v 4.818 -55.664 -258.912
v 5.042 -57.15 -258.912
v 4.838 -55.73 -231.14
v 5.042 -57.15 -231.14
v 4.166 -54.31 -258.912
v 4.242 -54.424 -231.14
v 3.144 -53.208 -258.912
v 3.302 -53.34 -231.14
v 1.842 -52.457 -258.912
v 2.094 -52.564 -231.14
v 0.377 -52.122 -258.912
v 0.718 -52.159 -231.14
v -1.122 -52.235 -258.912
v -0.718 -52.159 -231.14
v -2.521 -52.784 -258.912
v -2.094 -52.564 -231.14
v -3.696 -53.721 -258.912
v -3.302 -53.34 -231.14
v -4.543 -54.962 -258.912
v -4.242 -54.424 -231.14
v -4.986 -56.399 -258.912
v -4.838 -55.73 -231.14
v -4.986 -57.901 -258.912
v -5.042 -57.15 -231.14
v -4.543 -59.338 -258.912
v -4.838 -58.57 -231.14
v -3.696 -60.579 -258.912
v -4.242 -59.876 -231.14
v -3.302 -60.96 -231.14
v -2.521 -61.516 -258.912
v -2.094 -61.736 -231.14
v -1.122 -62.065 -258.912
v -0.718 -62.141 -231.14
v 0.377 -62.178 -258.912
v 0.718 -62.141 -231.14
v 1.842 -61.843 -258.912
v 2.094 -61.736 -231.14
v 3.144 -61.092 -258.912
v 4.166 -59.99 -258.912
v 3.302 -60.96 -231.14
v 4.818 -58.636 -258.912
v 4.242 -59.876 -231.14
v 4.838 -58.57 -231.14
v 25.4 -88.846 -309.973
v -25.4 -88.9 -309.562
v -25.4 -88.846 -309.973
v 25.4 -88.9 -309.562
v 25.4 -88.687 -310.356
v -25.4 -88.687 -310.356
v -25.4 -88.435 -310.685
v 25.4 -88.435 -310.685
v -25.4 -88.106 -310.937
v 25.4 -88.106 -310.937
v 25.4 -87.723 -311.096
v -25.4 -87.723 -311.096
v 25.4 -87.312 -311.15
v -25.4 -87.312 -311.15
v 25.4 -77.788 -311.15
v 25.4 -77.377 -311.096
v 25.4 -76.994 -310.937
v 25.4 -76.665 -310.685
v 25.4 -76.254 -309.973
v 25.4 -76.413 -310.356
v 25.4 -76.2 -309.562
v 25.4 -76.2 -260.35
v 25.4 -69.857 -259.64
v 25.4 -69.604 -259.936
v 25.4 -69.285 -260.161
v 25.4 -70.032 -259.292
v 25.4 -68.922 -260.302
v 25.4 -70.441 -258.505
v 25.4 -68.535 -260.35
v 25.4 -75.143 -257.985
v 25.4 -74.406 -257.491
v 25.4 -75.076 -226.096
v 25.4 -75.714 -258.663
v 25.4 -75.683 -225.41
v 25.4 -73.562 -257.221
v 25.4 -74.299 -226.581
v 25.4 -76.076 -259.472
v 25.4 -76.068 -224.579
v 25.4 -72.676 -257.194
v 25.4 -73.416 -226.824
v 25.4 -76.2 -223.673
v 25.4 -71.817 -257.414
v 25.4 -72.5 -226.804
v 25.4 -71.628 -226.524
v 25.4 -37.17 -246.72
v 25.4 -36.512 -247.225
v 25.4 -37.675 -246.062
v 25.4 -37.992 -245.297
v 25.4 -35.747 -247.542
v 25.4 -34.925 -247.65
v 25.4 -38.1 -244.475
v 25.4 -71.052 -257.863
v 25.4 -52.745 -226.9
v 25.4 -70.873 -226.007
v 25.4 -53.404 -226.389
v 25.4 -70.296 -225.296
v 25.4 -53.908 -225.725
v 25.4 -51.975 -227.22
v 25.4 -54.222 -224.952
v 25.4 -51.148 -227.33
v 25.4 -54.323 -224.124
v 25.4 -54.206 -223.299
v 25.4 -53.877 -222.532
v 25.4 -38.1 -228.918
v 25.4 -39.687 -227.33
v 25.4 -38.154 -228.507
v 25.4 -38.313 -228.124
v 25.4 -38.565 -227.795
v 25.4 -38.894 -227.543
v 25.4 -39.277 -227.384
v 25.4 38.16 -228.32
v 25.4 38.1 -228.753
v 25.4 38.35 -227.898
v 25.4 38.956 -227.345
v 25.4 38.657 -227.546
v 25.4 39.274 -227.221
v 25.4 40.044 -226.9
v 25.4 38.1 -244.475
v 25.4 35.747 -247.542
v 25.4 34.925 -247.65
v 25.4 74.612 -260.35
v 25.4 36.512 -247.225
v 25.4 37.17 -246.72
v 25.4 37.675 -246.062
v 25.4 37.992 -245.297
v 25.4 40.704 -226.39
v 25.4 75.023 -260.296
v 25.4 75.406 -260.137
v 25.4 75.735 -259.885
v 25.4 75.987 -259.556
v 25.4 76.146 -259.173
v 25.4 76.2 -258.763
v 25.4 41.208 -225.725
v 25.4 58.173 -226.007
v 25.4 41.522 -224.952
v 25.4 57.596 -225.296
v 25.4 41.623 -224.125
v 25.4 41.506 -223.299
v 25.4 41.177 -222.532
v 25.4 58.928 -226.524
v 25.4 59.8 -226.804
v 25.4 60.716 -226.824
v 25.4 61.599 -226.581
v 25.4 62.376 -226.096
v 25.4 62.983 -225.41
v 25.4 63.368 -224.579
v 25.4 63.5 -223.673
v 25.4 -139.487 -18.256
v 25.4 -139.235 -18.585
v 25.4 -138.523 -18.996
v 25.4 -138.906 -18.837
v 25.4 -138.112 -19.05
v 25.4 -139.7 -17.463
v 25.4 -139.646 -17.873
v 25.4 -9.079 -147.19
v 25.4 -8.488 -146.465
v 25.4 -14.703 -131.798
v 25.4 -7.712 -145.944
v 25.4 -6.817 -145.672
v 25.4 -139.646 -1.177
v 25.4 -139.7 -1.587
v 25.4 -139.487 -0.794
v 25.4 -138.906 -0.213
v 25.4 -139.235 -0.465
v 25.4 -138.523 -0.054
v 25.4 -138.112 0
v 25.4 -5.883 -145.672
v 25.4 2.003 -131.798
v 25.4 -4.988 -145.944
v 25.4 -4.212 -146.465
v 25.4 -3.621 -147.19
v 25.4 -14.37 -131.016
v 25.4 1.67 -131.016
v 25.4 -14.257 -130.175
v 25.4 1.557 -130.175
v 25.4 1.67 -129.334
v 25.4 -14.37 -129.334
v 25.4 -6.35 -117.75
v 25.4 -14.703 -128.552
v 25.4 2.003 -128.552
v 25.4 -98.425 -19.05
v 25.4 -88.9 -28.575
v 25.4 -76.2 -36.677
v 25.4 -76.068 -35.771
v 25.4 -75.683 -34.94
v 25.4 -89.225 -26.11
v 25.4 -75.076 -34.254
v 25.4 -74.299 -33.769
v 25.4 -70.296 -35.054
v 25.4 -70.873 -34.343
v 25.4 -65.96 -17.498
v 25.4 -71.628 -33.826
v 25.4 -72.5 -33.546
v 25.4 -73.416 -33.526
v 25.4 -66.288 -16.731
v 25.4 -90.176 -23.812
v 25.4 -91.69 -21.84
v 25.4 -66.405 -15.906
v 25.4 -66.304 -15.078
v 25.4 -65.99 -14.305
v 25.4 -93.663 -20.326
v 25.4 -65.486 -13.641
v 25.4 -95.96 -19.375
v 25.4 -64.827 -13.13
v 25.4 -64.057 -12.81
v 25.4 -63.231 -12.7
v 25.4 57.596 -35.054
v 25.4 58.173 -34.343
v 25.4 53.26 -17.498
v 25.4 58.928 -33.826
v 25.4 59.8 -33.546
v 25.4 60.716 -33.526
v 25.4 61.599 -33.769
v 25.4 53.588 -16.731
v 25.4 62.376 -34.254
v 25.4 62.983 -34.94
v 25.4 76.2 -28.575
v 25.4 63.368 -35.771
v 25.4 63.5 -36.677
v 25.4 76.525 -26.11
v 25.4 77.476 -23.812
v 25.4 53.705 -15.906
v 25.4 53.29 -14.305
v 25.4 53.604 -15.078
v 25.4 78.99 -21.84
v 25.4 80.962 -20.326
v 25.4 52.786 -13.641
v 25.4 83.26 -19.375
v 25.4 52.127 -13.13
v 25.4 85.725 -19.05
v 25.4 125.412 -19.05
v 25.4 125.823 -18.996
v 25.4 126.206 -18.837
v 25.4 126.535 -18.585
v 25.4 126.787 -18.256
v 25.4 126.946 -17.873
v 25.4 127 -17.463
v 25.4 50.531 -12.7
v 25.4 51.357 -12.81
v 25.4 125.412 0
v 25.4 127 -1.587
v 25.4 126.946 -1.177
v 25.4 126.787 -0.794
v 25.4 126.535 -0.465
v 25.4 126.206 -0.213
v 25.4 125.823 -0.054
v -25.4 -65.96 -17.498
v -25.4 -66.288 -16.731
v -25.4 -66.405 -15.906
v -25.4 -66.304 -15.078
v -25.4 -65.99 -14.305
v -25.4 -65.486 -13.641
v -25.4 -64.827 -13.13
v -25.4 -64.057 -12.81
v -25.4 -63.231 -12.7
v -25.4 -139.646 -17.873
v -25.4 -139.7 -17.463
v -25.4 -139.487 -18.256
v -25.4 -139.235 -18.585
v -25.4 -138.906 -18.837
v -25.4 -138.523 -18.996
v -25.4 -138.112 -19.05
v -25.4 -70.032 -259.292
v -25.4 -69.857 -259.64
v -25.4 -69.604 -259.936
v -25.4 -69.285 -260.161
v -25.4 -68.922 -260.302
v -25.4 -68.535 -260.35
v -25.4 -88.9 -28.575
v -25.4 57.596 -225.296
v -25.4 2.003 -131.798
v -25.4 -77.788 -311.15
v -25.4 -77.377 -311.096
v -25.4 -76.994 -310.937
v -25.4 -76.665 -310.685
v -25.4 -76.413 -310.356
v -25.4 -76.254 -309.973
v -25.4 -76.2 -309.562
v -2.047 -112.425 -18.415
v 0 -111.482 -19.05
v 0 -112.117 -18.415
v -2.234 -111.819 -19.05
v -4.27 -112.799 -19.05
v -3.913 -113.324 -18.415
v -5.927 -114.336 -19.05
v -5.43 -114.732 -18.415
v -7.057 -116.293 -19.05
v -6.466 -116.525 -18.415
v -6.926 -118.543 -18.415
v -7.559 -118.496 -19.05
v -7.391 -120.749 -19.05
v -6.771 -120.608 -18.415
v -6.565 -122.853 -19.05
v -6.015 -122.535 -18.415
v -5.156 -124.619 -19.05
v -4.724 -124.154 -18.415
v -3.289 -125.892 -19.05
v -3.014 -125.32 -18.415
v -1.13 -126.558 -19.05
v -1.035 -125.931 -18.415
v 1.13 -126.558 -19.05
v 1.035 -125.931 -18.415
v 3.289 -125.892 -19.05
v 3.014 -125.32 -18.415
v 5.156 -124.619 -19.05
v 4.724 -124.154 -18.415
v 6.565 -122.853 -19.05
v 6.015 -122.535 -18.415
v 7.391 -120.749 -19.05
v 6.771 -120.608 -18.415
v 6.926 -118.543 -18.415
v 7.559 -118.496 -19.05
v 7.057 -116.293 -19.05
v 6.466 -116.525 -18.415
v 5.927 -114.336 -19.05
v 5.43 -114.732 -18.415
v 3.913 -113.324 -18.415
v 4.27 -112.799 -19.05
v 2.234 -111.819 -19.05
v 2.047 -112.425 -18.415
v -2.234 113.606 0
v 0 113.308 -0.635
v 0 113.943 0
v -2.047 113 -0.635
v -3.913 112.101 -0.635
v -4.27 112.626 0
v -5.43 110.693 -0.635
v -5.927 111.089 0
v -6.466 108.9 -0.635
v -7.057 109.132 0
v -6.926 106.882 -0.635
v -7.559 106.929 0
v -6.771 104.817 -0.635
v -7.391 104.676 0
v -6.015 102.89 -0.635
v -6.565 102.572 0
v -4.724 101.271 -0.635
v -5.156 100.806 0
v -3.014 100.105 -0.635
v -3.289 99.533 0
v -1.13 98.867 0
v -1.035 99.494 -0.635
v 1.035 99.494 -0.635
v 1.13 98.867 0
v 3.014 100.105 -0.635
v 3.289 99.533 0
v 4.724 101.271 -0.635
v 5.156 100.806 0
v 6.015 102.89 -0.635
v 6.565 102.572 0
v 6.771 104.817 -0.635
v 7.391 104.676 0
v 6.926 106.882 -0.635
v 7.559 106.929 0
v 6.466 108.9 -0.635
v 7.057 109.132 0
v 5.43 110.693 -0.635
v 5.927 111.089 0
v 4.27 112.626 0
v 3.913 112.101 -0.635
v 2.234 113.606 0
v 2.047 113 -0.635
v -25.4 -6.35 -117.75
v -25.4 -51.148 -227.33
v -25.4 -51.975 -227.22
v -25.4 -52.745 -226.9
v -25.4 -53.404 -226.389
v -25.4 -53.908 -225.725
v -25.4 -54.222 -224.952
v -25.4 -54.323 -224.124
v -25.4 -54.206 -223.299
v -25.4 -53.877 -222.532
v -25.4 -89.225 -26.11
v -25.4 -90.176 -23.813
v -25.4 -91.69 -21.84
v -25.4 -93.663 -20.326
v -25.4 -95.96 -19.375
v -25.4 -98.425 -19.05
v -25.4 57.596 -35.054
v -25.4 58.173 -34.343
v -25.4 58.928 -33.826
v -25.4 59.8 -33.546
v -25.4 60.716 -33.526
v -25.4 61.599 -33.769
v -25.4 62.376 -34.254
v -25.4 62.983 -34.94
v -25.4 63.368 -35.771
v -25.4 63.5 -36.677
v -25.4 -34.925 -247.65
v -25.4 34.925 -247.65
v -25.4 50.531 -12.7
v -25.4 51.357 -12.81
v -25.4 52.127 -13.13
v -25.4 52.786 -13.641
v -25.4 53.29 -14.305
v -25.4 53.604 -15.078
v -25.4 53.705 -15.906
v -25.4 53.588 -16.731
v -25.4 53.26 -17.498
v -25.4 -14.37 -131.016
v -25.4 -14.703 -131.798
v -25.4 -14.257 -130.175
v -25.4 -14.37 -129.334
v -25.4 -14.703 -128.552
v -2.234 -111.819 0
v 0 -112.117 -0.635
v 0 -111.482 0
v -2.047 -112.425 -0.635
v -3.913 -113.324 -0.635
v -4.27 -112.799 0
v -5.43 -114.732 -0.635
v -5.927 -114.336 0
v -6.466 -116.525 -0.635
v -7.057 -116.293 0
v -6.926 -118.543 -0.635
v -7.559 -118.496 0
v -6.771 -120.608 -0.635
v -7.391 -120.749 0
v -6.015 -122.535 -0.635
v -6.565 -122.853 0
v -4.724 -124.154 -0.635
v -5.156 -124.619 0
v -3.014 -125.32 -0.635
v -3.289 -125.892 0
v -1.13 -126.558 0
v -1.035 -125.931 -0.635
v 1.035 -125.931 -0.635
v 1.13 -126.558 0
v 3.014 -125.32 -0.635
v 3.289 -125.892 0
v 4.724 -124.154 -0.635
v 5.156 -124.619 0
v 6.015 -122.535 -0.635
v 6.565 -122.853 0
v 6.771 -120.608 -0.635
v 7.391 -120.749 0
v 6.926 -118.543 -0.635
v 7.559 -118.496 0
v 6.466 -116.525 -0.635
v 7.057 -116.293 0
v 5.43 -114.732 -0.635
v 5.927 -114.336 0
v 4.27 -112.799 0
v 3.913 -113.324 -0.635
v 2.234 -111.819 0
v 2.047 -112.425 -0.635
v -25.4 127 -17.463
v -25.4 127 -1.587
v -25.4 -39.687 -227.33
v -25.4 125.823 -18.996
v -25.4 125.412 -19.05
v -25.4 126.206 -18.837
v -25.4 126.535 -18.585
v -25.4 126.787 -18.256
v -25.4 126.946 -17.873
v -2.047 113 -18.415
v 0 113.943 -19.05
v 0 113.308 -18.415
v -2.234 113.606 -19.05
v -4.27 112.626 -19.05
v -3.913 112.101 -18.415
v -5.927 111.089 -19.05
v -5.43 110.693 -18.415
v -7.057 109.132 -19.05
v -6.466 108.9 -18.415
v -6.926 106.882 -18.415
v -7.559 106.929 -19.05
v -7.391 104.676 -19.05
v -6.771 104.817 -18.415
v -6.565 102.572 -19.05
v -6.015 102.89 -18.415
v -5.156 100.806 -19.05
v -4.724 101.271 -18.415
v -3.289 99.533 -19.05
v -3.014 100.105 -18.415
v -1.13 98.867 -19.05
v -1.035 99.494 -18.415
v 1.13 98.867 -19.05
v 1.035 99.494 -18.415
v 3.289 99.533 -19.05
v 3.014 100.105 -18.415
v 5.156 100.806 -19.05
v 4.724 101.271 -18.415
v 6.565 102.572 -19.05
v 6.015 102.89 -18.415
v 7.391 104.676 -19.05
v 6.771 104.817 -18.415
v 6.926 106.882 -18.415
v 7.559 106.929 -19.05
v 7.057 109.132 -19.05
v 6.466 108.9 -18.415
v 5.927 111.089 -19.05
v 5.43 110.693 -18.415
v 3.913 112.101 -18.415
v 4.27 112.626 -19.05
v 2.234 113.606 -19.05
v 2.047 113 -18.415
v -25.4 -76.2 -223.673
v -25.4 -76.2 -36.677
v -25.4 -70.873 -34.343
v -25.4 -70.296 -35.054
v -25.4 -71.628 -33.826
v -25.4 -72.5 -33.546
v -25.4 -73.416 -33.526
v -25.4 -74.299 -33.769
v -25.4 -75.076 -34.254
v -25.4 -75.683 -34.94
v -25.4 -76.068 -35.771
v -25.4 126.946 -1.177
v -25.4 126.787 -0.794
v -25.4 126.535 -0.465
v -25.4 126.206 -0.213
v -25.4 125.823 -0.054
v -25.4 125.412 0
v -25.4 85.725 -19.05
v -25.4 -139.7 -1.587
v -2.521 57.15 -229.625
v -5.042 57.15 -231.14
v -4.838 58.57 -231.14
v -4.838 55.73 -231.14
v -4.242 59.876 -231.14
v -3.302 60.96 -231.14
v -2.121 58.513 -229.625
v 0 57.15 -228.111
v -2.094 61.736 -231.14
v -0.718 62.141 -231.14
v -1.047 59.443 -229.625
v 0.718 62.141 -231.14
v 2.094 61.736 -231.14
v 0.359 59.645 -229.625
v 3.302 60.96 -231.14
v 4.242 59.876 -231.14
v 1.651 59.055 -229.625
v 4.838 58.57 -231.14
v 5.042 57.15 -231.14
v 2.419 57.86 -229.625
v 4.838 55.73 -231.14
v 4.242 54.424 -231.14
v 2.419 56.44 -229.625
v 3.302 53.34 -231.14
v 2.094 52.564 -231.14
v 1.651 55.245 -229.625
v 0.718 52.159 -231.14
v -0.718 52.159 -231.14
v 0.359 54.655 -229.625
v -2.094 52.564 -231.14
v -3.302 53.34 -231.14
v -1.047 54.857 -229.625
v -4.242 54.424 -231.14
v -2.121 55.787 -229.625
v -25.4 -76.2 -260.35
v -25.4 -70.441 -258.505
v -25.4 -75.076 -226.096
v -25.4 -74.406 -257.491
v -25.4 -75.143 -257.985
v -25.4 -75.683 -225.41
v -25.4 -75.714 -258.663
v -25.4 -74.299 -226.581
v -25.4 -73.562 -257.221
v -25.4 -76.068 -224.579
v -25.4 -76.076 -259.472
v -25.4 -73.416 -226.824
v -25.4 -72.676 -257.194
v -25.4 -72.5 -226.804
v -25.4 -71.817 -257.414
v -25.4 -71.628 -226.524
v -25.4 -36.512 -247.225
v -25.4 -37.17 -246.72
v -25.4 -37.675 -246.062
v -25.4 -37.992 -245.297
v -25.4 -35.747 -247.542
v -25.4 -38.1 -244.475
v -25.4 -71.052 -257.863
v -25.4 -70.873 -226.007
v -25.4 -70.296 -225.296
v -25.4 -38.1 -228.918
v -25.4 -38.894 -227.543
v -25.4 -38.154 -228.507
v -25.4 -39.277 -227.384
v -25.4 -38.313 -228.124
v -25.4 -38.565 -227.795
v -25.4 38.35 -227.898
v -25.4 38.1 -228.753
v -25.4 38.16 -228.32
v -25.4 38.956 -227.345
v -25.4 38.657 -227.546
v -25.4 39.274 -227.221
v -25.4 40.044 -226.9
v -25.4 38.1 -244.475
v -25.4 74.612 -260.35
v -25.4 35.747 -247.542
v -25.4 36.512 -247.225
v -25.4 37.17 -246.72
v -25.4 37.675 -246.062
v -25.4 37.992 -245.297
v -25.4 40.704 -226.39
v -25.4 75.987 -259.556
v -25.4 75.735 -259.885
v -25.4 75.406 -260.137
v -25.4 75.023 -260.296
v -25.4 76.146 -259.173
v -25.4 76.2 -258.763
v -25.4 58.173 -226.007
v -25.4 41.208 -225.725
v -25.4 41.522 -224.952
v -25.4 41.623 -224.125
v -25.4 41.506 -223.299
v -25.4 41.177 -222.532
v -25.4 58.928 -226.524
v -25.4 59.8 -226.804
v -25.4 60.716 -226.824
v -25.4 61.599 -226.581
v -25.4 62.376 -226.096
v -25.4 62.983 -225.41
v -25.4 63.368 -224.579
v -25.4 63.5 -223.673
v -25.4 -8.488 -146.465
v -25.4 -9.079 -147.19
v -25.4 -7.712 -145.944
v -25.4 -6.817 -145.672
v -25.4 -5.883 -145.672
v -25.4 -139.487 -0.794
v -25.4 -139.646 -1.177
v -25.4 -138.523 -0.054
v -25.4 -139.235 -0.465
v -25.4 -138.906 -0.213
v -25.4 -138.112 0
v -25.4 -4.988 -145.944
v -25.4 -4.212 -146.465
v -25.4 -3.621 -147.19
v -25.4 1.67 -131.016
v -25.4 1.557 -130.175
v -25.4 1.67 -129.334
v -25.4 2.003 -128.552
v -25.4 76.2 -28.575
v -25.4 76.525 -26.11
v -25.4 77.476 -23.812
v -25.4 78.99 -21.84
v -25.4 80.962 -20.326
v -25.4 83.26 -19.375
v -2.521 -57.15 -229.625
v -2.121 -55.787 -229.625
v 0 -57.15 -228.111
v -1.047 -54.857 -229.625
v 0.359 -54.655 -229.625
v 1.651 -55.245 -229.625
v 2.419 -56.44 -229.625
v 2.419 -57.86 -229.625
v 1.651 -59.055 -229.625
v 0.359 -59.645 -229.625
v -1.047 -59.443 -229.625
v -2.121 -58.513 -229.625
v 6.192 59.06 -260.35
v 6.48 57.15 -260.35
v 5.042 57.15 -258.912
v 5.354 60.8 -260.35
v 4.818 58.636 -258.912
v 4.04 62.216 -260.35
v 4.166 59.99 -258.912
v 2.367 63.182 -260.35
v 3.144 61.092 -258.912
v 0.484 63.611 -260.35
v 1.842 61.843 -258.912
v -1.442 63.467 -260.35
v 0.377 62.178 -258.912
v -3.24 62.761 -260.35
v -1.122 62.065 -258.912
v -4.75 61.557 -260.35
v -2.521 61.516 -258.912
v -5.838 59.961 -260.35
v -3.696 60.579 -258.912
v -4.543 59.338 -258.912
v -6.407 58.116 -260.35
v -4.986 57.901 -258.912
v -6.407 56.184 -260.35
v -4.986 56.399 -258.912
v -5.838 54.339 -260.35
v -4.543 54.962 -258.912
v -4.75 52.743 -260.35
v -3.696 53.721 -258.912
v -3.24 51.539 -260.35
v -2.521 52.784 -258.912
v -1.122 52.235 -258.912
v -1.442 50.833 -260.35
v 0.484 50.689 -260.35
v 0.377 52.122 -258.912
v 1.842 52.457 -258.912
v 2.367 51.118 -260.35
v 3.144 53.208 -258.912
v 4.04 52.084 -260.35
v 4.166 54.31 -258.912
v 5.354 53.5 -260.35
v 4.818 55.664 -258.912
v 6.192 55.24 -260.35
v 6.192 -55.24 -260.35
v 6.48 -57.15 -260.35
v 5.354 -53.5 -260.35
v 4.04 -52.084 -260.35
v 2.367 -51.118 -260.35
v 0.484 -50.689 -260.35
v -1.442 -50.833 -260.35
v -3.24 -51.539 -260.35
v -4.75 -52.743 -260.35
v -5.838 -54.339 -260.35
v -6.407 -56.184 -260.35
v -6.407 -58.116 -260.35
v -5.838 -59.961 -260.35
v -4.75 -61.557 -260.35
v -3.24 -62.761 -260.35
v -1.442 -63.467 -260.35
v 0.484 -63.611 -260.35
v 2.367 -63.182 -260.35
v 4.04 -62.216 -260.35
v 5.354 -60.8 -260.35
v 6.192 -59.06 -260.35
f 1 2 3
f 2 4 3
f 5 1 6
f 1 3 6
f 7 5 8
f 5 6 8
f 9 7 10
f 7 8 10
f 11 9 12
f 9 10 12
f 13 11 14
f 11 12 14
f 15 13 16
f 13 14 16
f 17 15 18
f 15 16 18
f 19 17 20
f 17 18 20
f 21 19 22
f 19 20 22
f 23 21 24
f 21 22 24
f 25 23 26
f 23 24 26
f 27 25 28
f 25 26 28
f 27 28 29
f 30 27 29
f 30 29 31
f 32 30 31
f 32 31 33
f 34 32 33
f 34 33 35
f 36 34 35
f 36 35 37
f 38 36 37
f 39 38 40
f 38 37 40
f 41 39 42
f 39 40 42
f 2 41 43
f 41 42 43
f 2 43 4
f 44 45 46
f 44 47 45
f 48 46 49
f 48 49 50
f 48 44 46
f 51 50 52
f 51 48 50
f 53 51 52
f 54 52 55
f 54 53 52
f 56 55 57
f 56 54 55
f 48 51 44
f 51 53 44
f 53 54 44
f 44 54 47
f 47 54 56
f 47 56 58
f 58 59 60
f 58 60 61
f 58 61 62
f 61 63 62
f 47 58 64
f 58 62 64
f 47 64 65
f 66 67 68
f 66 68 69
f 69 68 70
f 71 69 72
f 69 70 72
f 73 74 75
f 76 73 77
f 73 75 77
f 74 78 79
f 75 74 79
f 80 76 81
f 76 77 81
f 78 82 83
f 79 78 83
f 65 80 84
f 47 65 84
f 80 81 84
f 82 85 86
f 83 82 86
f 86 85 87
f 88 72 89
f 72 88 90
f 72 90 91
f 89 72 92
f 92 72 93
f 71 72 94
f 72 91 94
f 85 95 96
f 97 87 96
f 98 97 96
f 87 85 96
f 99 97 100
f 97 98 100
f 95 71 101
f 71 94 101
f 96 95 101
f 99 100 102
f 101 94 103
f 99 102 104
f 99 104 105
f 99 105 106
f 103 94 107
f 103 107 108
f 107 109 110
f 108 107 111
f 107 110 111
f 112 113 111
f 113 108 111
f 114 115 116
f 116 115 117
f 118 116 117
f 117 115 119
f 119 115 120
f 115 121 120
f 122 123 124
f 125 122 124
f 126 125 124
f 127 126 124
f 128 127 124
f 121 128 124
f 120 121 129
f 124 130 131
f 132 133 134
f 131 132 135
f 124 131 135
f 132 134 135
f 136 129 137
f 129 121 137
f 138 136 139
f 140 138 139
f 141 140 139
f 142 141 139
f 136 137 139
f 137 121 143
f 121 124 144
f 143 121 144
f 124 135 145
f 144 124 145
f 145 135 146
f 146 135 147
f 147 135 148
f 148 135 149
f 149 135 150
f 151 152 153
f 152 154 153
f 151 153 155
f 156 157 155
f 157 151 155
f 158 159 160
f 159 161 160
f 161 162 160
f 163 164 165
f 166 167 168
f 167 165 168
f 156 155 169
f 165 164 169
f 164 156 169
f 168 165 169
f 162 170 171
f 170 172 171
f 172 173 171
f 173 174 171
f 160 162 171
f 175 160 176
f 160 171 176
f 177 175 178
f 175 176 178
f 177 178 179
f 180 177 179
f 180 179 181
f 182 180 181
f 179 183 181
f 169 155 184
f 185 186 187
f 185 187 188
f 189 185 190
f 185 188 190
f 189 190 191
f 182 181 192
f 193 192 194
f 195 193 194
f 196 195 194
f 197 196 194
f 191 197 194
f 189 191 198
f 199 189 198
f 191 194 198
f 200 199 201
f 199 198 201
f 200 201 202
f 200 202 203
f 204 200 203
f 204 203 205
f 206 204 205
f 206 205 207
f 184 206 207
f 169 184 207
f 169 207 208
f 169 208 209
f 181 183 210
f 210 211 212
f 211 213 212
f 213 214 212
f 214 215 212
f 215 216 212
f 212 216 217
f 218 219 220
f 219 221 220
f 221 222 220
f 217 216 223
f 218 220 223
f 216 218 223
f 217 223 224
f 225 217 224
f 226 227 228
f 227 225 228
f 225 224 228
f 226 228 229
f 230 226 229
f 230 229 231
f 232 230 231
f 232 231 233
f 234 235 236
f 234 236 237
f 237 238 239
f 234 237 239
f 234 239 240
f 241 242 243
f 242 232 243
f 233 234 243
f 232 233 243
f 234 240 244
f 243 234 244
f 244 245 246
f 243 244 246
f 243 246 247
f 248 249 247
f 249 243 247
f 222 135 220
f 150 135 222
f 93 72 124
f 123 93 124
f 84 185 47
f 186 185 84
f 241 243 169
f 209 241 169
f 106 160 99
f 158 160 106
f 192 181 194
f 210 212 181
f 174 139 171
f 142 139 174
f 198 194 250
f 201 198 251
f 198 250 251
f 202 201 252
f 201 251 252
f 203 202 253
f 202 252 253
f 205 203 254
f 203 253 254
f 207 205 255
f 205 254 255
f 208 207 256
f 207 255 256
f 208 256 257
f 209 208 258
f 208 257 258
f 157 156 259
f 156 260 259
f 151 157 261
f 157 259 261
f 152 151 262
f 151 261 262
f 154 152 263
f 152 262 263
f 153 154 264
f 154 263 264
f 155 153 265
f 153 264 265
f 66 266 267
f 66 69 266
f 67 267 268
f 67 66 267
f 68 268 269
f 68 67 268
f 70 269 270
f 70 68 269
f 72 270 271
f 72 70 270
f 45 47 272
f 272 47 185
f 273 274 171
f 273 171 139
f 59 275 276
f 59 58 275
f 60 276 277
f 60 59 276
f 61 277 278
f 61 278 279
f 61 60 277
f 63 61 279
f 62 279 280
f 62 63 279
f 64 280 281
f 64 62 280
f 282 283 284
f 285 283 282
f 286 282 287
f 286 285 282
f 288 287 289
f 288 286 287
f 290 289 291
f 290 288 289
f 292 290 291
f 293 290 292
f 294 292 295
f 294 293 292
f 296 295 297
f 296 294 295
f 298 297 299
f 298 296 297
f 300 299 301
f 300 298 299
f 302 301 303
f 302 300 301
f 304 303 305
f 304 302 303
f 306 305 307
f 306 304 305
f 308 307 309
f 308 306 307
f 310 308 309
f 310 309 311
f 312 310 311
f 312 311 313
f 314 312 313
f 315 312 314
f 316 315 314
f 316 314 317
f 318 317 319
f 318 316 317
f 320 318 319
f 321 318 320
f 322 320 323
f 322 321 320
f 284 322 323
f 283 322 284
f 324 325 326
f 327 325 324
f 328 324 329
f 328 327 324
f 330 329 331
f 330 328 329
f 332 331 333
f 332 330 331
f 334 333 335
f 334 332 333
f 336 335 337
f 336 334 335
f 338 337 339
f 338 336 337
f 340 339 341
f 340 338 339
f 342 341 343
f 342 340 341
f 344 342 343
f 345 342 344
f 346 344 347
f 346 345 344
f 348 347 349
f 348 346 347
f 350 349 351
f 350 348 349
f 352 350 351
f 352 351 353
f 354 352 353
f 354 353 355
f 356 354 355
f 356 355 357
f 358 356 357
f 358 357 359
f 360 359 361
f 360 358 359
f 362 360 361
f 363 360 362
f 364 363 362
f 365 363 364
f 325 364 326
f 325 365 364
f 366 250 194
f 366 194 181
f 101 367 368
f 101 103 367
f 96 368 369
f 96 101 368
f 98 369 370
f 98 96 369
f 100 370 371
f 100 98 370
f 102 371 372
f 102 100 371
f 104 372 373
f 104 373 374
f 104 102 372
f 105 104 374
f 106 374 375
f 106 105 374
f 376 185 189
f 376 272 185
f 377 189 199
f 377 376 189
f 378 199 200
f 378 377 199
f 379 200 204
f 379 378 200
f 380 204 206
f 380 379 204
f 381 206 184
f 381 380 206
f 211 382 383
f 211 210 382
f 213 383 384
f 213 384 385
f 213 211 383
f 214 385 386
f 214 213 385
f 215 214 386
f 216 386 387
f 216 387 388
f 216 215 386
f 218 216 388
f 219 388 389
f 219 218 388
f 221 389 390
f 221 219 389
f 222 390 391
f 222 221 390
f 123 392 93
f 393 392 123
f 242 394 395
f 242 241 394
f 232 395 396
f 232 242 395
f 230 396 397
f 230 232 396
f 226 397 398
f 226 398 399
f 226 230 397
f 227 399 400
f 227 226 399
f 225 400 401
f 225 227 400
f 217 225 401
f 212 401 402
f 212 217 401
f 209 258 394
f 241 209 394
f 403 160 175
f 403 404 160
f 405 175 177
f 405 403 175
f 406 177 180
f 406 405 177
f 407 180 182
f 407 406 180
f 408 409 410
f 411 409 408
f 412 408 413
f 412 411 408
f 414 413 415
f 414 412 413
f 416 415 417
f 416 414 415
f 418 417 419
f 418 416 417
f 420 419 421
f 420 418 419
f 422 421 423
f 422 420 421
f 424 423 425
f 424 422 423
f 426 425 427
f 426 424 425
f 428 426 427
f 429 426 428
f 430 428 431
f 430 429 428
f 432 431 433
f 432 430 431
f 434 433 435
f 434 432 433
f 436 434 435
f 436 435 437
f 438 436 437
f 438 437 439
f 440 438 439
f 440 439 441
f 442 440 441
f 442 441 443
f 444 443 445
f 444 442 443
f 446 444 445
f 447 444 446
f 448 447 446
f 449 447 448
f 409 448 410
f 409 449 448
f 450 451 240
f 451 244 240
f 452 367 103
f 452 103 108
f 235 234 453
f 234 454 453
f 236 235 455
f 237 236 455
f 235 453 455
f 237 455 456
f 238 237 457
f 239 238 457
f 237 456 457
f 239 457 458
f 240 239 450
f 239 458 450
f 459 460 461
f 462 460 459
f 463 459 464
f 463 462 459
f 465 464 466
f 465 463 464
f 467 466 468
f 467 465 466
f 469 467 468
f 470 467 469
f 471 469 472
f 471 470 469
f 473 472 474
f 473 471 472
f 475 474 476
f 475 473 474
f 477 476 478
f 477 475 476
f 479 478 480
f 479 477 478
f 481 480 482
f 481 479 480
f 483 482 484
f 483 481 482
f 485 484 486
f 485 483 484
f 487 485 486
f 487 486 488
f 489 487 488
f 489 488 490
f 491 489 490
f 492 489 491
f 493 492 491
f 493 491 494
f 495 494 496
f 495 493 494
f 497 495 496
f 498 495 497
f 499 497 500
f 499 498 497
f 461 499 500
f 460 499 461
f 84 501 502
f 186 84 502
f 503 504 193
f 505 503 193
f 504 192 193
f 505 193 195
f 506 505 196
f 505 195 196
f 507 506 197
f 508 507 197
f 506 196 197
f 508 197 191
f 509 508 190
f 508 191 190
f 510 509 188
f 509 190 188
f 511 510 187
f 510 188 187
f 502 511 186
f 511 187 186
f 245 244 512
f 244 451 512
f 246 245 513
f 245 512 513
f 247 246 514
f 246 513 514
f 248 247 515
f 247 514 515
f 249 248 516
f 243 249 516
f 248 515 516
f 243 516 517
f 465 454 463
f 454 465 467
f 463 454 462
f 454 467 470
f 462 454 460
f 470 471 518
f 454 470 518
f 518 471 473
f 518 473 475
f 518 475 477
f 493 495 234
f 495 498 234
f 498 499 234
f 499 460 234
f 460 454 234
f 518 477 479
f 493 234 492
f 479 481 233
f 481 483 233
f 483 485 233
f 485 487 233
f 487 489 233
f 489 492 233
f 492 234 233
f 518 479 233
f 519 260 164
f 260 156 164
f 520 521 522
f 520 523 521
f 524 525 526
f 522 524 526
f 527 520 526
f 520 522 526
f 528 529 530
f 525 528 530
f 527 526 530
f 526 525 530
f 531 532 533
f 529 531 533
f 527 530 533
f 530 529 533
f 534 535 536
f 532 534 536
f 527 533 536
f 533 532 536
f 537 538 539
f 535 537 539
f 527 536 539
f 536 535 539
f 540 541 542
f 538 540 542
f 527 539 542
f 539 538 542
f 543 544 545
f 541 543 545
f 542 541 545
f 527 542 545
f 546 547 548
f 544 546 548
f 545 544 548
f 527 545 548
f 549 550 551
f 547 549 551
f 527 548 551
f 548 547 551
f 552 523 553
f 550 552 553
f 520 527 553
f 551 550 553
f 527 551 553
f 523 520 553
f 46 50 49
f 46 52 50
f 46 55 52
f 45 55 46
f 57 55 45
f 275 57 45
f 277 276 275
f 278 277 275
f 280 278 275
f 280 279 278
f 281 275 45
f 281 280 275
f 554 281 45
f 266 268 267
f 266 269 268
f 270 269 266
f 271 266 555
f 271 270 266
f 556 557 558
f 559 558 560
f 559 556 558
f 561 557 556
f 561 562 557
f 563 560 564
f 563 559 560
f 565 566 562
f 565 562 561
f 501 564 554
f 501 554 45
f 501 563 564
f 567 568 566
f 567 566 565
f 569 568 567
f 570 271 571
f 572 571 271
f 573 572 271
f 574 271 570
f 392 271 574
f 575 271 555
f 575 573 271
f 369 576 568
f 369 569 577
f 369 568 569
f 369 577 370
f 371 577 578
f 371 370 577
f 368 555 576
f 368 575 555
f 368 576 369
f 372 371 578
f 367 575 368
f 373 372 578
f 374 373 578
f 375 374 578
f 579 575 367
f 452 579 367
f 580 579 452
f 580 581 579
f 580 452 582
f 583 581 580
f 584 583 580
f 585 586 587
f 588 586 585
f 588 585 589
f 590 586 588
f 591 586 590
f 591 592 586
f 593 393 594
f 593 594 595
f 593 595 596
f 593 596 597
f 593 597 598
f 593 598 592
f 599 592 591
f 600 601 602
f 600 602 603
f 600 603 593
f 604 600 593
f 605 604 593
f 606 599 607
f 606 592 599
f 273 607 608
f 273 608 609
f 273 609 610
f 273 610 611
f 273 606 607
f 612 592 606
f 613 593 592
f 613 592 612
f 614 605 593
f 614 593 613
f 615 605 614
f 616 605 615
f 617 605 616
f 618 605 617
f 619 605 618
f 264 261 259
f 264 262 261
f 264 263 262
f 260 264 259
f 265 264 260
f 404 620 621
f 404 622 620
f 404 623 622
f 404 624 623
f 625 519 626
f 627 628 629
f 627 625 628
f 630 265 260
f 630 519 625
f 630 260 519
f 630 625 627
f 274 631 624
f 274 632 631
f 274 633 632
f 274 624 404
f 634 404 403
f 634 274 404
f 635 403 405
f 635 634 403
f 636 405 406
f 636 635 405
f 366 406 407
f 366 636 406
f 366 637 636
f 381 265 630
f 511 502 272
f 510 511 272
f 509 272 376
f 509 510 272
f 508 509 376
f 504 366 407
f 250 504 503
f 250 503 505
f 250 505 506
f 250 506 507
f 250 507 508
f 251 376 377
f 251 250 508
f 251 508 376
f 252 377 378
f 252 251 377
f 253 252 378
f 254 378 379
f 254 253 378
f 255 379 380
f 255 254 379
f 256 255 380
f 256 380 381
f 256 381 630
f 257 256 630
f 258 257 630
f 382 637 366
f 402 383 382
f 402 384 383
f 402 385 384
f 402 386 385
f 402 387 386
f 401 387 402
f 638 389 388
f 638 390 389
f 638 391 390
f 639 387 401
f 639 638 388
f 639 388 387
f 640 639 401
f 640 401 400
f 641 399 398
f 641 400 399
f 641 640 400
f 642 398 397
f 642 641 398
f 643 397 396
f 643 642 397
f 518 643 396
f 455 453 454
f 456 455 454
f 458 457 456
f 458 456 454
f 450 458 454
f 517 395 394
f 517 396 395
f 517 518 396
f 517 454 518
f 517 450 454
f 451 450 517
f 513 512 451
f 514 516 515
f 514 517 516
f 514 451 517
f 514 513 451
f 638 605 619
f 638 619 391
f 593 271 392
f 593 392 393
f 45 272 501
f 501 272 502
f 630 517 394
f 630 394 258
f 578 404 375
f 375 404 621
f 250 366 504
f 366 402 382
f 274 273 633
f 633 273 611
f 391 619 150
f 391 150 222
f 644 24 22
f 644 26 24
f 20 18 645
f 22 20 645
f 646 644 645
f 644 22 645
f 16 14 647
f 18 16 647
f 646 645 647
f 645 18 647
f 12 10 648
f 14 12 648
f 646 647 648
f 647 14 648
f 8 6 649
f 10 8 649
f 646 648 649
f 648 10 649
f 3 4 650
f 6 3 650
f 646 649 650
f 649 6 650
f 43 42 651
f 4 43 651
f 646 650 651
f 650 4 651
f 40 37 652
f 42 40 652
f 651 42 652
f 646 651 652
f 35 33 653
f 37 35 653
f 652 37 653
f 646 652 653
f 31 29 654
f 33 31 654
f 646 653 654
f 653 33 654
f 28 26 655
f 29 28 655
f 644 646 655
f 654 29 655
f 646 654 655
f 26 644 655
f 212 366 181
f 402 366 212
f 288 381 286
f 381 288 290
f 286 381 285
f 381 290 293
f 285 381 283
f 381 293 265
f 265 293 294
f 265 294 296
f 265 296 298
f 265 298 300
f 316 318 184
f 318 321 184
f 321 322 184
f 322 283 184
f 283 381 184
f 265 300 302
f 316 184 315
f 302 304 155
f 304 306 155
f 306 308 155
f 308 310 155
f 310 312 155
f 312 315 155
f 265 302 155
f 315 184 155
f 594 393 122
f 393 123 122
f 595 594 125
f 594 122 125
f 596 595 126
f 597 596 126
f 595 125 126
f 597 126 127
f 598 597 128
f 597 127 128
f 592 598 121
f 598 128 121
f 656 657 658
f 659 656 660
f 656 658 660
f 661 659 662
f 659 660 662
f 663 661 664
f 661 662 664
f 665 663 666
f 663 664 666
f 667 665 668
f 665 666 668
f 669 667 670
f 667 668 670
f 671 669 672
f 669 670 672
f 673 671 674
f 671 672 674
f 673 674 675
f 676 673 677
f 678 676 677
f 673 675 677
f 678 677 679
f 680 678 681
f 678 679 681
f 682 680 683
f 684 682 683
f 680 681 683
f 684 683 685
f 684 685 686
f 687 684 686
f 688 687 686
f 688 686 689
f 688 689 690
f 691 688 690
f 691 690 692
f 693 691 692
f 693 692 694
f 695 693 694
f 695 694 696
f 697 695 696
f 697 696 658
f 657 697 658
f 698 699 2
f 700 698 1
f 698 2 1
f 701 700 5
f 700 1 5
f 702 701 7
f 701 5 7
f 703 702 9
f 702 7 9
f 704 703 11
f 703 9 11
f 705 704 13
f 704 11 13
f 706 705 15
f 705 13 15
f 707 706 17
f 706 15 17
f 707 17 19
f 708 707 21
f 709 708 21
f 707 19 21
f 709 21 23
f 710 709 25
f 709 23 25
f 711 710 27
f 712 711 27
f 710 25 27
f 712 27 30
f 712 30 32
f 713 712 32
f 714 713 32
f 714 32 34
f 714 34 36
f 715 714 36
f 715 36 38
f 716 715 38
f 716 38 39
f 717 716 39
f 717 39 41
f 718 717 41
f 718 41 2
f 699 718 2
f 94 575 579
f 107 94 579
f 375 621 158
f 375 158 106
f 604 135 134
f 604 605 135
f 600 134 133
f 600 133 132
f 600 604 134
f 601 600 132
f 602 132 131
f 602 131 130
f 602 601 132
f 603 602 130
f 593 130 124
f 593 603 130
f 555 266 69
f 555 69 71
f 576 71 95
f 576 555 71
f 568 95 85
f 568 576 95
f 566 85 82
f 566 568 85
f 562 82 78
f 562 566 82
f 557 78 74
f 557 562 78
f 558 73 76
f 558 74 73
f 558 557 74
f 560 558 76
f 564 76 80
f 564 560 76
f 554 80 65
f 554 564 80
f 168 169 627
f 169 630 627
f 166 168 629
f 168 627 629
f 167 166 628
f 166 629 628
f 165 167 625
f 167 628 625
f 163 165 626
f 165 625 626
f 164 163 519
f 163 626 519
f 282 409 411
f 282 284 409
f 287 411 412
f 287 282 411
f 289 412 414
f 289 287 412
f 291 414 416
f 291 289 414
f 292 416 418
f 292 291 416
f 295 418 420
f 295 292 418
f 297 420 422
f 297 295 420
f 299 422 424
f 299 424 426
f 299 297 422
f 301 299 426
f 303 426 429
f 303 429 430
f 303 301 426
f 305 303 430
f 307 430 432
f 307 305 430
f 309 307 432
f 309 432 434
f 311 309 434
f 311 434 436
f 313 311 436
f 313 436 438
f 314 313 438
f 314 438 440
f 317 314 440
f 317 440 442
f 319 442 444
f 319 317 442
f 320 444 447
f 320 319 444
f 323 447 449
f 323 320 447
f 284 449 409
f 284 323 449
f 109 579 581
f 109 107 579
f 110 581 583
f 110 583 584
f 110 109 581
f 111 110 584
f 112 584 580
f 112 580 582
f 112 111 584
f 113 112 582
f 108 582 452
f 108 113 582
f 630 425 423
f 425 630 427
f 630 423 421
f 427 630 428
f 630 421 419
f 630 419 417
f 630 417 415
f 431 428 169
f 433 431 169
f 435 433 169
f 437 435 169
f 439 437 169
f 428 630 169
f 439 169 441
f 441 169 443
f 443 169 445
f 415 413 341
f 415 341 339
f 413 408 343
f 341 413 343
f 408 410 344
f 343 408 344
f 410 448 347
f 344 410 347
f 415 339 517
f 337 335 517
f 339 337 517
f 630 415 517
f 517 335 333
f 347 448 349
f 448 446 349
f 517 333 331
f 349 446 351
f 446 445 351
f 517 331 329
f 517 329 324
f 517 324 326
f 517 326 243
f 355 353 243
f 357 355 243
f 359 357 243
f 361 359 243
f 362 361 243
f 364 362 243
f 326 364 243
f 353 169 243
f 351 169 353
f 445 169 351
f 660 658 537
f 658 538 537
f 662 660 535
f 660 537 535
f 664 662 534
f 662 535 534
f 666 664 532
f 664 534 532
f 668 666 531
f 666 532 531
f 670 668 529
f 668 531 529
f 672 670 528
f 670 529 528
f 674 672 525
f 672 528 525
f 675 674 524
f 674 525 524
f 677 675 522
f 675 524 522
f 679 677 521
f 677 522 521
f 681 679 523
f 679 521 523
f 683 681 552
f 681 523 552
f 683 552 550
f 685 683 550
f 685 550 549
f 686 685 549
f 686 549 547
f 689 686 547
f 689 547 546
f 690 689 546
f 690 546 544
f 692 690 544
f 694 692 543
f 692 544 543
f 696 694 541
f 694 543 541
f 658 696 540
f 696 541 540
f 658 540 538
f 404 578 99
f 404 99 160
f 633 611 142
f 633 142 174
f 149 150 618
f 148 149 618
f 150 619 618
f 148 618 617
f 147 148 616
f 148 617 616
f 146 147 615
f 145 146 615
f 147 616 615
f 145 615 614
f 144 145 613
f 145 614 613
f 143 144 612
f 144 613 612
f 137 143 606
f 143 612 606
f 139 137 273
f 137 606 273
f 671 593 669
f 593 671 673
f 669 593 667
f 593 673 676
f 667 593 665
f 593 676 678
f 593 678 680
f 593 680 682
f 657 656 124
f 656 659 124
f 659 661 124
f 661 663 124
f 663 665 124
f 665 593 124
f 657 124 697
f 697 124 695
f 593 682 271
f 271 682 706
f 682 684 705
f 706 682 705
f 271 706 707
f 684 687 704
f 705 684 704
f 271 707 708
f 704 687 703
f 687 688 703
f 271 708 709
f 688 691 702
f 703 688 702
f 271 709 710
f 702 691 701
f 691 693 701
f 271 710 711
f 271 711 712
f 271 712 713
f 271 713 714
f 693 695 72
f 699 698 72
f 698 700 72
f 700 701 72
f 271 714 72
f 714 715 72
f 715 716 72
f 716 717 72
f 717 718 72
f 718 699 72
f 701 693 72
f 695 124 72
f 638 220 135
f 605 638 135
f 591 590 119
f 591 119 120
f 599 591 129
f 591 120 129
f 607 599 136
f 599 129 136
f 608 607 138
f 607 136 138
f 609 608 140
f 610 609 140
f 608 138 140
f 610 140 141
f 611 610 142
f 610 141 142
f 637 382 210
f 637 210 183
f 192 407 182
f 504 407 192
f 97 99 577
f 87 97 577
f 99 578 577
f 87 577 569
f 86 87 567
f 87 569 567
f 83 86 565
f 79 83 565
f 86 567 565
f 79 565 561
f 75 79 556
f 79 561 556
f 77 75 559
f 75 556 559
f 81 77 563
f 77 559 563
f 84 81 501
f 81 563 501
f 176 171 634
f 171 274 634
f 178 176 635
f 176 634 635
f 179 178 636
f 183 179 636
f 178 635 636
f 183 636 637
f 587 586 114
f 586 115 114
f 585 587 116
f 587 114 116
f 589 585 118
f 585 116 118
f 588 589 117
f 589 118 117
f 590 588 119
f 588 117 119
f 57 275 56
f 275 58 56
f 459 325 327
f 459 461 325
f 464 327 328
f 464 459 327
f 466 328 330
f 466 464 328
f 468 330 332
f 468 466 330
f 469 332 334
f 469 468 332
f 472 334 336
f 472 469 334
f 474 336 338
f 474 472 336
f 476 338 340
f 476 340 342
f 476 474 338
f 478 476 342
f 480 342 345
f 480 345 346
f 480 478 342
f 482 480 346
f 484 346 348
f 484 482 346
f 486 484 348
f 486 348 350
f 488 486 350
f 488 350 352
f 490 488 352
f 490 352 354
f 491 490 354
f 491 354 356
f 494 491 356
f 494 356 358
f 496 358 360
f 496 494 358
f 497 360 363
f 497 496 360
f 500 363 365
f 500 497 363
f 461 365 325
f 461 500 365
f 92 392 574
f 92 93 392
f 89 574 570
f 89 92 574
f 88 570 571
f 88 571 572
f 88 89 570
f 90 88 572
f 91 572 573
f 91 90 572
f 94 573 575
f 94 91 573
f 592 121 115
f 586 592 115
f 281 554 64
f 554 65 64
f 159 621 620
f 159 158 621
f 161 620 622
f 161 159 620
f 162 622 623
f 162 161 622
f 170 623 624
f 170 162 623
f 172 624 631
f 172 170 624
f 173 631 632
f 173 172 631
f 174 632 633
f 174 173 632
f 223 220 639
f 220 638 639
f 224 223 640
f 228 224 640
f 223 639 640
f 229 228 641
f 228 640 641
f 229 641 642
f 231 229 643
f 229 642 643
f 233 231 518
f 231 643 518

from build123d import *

# Parameters (mm, degrees)
BOSS_EXTRUDE1_DEPTH                          = 25.4
SKETCH2_W                                    = 234.95
SKETCH2_H                                    = 139.7
CUT_EXTRUDE1_DEPTH                           = 51.8
EXTRUDE_THIN1_DEPTH                          = 50.8
EXTRUDE_THIN2_DEPTH                          = 50.8
FILLET5_R                                    = 3.175
SKETCH11_W                                   = 33.02
SKETCH11_H                                   = 38.1
BOSS_EXTRUDE2_DEPTH                          = 50.8
TAPPED_HOLE_FOR_3_8_16_HELICOIL1_D           = 10.0838
TAPPED_HOLE_FOR_3_8_16_HELICOIL1_DEPTH       = 29.21
TAPPED_HOLE_FOR_3_8_16_HELICOIL1_CSINK_D     = 12.95908
TAPPED_HOLE_FOR_3_8_16_HELICOIL1_CSINK_ANGLE = 90
TAPPED_HOLE_FOR_3_8_16_HELICOIL1_TIP         = 3.029479155
CUT_EXTRUDE2_DEPTH                           = 51.8
FILLET1_R                                    = 3.175
FILLET2_R                                    = 1.5875
FILLET3_R                                    = 9.525
F_1_2_CLEARANCE_HOLE1_AT_2_COUNT             = 2
F_1_2_CLEARANCE_HOLE1_AT_2_PITCH             = 225.425


with BuildPart() as part:
    # Sketch1 → Boss-Extrude1 (new body, symmetric)
    with BuildSketch(Plane(origin=(0, 0, 0), x_dir=(0, 0, -1), z_dir=(1, 0, 0))):
        Polygon((311.15, -88.9), (19.05, -88.9), (19.05, -139.7), (0, -139.7), (0, 127), (19.05, 127), (19.05, 76.2), (260.35, 76.2), (260.35, -76.2), (311.15, -76.2), align=None)
    extrude(amount=BOSS_EXTRUDE1_DEPTH, both=True)

    # Sketch2 → Cut-Extrude1 (cut, through all)
    with BuildSketch(Plane.ZY.offset(25.4)):
        with Locations((-130.175, -6.35)):
            Rectangle(SKETCH2_W, SKETCH2_H)
    extrude(amount=-CUT_EXTRUDE1_DEPTH, mode=Mode.SUBTRACT)

    # Sketch3 → Extrude-Thin1 (add)
    with BuildSketch(Plane.ZY.offset(25.4)):
        Polygon((-250.895328745, 58.041947111), (-15.945328745, -81.658052889), (-9.454671255, -70.741947111), (-244.404671255, 68.958052889), align=None)
    extrude(amount=-EXTRUDE_THIN1_DEPTH)

    # Sketch4 → Extrude-Thin2 (add)
    with BuildSketch(Plane.ZY.offset(25.4)):
        Polygon((-244.404671255, -81.658052889), (-9.454671255, 58.041947111), (-15.945328745, 68.958052889), (-250.895328745, -70.741947111), align=None)
    extrude(amount=-EXTRUDE_THIN2_DEPTH)

    # Fillet5
    fillet5_edges = [part.edges().sort_by_distance(p)[0] for p in [
        (0, -76.2, -235.225218669),
        (0, 63.5, -235.225218669),
    ]]
    fillet(fillet5_edges, radius=FILLET5_R)

    # Sketch11 → Boss-Extrude2 (add)
    with BuildSketch(Plane.ZY.offset(25.4)):
        with Locations((-243.84, -57.15)):
            Rectangle(SKETCH11_W, SKETCH11_H)
    boss_extrude2 = extrude(amount=-BOSS_EXTRUDE2_DEPTH)

    # Mirror2: Boss-Extrude2 across plane
    add(boss_extrude2.mirror(Plane.ZX))

    # Tapped Hole for 3/8-16 Helicoil1
    with Locations(Plane(origin=(-14.876894715, 2.702023936, -260.35), x_dir=(-1, 0, 0), z_dir=(0, 0, -1))):
        with Locations((-14.876894715, 54.447976064), (-14.876894715, -59.852023936)):
            CounterSinkHole(TAPPED_HOLE_FOR_3_8_16_HELICOIL1_D / 2, TAPPED_HOLE_FOR_3_8_16_HELICOIL1_CSINK_D / 2, depth=TAPPED_HOLE_FOR_3_8_16_HELICOIL1_DEPTH, counter_sink_angle=TAPPED_HOLE_FOR_3_8_16_HELICOIL1_CSINK_ANGLE)
            with Locations((0, 0, -(TAPPED_HOLE_FOR_3_8_16_HELICOIL1_DEPTH + TAPPED_HOLE_FOR_3_8_16_HELICOIL1_TIP / 2))):  # 118° drill point
                Cone(0, TAPPED_HOLE_FOR_3_8_16_HELICOIL1_D / 2, TAPPED_HOLE_FOR_3_8_16_HELICOIL1_TIP, mode=Mode.SUBTRACT)

    # Sketch12 → Cut-Extrude2 (cut, through all)
    with BuildSketch(Plane.ZY.offset(25.4)):
        with BuildLine():
            Line((-260.35, -76.2), (-260.35, -69.85))
            ThreePointArc((-260.35, -69.85), (-257.175, -73.025), (-260.35, -76.2))
        make_face()
    extrude(amount=-CUT_EXTRUDE2_DEPTH, mode=Mode.SUBTRACT)

    # Fillet1
    fillet1_edges = [part.edges().sort_by_distance(p)[0] for p in [
        (0, -56.73013002, -227.33),
        (0, -38.1, -247.65),
        (0, 44.03013002, -227.33),
        (0, 38.1, -247.65),
        (0, -76.2, -25.124781331),
        (0, -68.812292182, -12.7),
        (0, -6.35, -142.599781331),
        (0, -13.737707818, -130.175),
        (0, 56.112292182, -12.7),
        (0, 63.5, -25.124781331),
        (0, 1.037707818, -130.175),
    ]]
    fillet(fillet1_edges, radius=FILLET1_R)

    # Fillet2
    fillet2_edges = [part.edges().sort_by_distance(p)[0] for p in [
        (0, 127, 0),
        (0, 127, -19.05),
        (0, -139.7, 0),
        (0, -139.7, -19.05),
        (0, -88.9, -311.15),
        (0, -76.2, -311.15),
        (0, 76.2, -260.35),
        (0, 38.1, -227.33),
        (0, -38.1, -227.33),
        (0, -69.85, -260.35),
    ]]
    fillet(fillet2_edges, radius=FILLET2_R)

    # Fillet3
    fillet3_edges = [part.edges().sort_by_distance(p)[0] for p in [
        (0, -88.9, -19.05),
        (0, 76.2, -19.05),
    ]]
    fillet(fillet3_edges, radius=FILLET3_R)

    # Sketch9 → 1/2 Clearance Hole1 (revolve, cut)
    with BuildSketch(Plane(origin=(0, 106.3625, -19.05), x_dir=(0, 1, 0), z_dir=(1, 0, 0))):
        Polygon((0, 0), (0, 19.05), (7.58063, 19.05), (6.94563, 18.415), (6.94563, 0.635), (7.58063, 0), align=None)
    f_1_2_clearance_hole1 = revolve(axis=Axis((0, 106.3625, -25.4), (0, 0, 1)), mode=Mode.SUBTRACT)

    # 1/2 Clearance Hole1 at 2: 1/2 Clearance Hole1 ×2
    with Locations(*[(0, -i * F_1_2_CLEARANCE_HOLE1_AT_2_PITCH, 0) for i in range(1, F_1_2_CLEARANCE_HOLE1_AT_2_COUNT)]):
        add(f_1_2_clearance_hole1, mode=Mode.SUBTRACT)


solid = part.part
